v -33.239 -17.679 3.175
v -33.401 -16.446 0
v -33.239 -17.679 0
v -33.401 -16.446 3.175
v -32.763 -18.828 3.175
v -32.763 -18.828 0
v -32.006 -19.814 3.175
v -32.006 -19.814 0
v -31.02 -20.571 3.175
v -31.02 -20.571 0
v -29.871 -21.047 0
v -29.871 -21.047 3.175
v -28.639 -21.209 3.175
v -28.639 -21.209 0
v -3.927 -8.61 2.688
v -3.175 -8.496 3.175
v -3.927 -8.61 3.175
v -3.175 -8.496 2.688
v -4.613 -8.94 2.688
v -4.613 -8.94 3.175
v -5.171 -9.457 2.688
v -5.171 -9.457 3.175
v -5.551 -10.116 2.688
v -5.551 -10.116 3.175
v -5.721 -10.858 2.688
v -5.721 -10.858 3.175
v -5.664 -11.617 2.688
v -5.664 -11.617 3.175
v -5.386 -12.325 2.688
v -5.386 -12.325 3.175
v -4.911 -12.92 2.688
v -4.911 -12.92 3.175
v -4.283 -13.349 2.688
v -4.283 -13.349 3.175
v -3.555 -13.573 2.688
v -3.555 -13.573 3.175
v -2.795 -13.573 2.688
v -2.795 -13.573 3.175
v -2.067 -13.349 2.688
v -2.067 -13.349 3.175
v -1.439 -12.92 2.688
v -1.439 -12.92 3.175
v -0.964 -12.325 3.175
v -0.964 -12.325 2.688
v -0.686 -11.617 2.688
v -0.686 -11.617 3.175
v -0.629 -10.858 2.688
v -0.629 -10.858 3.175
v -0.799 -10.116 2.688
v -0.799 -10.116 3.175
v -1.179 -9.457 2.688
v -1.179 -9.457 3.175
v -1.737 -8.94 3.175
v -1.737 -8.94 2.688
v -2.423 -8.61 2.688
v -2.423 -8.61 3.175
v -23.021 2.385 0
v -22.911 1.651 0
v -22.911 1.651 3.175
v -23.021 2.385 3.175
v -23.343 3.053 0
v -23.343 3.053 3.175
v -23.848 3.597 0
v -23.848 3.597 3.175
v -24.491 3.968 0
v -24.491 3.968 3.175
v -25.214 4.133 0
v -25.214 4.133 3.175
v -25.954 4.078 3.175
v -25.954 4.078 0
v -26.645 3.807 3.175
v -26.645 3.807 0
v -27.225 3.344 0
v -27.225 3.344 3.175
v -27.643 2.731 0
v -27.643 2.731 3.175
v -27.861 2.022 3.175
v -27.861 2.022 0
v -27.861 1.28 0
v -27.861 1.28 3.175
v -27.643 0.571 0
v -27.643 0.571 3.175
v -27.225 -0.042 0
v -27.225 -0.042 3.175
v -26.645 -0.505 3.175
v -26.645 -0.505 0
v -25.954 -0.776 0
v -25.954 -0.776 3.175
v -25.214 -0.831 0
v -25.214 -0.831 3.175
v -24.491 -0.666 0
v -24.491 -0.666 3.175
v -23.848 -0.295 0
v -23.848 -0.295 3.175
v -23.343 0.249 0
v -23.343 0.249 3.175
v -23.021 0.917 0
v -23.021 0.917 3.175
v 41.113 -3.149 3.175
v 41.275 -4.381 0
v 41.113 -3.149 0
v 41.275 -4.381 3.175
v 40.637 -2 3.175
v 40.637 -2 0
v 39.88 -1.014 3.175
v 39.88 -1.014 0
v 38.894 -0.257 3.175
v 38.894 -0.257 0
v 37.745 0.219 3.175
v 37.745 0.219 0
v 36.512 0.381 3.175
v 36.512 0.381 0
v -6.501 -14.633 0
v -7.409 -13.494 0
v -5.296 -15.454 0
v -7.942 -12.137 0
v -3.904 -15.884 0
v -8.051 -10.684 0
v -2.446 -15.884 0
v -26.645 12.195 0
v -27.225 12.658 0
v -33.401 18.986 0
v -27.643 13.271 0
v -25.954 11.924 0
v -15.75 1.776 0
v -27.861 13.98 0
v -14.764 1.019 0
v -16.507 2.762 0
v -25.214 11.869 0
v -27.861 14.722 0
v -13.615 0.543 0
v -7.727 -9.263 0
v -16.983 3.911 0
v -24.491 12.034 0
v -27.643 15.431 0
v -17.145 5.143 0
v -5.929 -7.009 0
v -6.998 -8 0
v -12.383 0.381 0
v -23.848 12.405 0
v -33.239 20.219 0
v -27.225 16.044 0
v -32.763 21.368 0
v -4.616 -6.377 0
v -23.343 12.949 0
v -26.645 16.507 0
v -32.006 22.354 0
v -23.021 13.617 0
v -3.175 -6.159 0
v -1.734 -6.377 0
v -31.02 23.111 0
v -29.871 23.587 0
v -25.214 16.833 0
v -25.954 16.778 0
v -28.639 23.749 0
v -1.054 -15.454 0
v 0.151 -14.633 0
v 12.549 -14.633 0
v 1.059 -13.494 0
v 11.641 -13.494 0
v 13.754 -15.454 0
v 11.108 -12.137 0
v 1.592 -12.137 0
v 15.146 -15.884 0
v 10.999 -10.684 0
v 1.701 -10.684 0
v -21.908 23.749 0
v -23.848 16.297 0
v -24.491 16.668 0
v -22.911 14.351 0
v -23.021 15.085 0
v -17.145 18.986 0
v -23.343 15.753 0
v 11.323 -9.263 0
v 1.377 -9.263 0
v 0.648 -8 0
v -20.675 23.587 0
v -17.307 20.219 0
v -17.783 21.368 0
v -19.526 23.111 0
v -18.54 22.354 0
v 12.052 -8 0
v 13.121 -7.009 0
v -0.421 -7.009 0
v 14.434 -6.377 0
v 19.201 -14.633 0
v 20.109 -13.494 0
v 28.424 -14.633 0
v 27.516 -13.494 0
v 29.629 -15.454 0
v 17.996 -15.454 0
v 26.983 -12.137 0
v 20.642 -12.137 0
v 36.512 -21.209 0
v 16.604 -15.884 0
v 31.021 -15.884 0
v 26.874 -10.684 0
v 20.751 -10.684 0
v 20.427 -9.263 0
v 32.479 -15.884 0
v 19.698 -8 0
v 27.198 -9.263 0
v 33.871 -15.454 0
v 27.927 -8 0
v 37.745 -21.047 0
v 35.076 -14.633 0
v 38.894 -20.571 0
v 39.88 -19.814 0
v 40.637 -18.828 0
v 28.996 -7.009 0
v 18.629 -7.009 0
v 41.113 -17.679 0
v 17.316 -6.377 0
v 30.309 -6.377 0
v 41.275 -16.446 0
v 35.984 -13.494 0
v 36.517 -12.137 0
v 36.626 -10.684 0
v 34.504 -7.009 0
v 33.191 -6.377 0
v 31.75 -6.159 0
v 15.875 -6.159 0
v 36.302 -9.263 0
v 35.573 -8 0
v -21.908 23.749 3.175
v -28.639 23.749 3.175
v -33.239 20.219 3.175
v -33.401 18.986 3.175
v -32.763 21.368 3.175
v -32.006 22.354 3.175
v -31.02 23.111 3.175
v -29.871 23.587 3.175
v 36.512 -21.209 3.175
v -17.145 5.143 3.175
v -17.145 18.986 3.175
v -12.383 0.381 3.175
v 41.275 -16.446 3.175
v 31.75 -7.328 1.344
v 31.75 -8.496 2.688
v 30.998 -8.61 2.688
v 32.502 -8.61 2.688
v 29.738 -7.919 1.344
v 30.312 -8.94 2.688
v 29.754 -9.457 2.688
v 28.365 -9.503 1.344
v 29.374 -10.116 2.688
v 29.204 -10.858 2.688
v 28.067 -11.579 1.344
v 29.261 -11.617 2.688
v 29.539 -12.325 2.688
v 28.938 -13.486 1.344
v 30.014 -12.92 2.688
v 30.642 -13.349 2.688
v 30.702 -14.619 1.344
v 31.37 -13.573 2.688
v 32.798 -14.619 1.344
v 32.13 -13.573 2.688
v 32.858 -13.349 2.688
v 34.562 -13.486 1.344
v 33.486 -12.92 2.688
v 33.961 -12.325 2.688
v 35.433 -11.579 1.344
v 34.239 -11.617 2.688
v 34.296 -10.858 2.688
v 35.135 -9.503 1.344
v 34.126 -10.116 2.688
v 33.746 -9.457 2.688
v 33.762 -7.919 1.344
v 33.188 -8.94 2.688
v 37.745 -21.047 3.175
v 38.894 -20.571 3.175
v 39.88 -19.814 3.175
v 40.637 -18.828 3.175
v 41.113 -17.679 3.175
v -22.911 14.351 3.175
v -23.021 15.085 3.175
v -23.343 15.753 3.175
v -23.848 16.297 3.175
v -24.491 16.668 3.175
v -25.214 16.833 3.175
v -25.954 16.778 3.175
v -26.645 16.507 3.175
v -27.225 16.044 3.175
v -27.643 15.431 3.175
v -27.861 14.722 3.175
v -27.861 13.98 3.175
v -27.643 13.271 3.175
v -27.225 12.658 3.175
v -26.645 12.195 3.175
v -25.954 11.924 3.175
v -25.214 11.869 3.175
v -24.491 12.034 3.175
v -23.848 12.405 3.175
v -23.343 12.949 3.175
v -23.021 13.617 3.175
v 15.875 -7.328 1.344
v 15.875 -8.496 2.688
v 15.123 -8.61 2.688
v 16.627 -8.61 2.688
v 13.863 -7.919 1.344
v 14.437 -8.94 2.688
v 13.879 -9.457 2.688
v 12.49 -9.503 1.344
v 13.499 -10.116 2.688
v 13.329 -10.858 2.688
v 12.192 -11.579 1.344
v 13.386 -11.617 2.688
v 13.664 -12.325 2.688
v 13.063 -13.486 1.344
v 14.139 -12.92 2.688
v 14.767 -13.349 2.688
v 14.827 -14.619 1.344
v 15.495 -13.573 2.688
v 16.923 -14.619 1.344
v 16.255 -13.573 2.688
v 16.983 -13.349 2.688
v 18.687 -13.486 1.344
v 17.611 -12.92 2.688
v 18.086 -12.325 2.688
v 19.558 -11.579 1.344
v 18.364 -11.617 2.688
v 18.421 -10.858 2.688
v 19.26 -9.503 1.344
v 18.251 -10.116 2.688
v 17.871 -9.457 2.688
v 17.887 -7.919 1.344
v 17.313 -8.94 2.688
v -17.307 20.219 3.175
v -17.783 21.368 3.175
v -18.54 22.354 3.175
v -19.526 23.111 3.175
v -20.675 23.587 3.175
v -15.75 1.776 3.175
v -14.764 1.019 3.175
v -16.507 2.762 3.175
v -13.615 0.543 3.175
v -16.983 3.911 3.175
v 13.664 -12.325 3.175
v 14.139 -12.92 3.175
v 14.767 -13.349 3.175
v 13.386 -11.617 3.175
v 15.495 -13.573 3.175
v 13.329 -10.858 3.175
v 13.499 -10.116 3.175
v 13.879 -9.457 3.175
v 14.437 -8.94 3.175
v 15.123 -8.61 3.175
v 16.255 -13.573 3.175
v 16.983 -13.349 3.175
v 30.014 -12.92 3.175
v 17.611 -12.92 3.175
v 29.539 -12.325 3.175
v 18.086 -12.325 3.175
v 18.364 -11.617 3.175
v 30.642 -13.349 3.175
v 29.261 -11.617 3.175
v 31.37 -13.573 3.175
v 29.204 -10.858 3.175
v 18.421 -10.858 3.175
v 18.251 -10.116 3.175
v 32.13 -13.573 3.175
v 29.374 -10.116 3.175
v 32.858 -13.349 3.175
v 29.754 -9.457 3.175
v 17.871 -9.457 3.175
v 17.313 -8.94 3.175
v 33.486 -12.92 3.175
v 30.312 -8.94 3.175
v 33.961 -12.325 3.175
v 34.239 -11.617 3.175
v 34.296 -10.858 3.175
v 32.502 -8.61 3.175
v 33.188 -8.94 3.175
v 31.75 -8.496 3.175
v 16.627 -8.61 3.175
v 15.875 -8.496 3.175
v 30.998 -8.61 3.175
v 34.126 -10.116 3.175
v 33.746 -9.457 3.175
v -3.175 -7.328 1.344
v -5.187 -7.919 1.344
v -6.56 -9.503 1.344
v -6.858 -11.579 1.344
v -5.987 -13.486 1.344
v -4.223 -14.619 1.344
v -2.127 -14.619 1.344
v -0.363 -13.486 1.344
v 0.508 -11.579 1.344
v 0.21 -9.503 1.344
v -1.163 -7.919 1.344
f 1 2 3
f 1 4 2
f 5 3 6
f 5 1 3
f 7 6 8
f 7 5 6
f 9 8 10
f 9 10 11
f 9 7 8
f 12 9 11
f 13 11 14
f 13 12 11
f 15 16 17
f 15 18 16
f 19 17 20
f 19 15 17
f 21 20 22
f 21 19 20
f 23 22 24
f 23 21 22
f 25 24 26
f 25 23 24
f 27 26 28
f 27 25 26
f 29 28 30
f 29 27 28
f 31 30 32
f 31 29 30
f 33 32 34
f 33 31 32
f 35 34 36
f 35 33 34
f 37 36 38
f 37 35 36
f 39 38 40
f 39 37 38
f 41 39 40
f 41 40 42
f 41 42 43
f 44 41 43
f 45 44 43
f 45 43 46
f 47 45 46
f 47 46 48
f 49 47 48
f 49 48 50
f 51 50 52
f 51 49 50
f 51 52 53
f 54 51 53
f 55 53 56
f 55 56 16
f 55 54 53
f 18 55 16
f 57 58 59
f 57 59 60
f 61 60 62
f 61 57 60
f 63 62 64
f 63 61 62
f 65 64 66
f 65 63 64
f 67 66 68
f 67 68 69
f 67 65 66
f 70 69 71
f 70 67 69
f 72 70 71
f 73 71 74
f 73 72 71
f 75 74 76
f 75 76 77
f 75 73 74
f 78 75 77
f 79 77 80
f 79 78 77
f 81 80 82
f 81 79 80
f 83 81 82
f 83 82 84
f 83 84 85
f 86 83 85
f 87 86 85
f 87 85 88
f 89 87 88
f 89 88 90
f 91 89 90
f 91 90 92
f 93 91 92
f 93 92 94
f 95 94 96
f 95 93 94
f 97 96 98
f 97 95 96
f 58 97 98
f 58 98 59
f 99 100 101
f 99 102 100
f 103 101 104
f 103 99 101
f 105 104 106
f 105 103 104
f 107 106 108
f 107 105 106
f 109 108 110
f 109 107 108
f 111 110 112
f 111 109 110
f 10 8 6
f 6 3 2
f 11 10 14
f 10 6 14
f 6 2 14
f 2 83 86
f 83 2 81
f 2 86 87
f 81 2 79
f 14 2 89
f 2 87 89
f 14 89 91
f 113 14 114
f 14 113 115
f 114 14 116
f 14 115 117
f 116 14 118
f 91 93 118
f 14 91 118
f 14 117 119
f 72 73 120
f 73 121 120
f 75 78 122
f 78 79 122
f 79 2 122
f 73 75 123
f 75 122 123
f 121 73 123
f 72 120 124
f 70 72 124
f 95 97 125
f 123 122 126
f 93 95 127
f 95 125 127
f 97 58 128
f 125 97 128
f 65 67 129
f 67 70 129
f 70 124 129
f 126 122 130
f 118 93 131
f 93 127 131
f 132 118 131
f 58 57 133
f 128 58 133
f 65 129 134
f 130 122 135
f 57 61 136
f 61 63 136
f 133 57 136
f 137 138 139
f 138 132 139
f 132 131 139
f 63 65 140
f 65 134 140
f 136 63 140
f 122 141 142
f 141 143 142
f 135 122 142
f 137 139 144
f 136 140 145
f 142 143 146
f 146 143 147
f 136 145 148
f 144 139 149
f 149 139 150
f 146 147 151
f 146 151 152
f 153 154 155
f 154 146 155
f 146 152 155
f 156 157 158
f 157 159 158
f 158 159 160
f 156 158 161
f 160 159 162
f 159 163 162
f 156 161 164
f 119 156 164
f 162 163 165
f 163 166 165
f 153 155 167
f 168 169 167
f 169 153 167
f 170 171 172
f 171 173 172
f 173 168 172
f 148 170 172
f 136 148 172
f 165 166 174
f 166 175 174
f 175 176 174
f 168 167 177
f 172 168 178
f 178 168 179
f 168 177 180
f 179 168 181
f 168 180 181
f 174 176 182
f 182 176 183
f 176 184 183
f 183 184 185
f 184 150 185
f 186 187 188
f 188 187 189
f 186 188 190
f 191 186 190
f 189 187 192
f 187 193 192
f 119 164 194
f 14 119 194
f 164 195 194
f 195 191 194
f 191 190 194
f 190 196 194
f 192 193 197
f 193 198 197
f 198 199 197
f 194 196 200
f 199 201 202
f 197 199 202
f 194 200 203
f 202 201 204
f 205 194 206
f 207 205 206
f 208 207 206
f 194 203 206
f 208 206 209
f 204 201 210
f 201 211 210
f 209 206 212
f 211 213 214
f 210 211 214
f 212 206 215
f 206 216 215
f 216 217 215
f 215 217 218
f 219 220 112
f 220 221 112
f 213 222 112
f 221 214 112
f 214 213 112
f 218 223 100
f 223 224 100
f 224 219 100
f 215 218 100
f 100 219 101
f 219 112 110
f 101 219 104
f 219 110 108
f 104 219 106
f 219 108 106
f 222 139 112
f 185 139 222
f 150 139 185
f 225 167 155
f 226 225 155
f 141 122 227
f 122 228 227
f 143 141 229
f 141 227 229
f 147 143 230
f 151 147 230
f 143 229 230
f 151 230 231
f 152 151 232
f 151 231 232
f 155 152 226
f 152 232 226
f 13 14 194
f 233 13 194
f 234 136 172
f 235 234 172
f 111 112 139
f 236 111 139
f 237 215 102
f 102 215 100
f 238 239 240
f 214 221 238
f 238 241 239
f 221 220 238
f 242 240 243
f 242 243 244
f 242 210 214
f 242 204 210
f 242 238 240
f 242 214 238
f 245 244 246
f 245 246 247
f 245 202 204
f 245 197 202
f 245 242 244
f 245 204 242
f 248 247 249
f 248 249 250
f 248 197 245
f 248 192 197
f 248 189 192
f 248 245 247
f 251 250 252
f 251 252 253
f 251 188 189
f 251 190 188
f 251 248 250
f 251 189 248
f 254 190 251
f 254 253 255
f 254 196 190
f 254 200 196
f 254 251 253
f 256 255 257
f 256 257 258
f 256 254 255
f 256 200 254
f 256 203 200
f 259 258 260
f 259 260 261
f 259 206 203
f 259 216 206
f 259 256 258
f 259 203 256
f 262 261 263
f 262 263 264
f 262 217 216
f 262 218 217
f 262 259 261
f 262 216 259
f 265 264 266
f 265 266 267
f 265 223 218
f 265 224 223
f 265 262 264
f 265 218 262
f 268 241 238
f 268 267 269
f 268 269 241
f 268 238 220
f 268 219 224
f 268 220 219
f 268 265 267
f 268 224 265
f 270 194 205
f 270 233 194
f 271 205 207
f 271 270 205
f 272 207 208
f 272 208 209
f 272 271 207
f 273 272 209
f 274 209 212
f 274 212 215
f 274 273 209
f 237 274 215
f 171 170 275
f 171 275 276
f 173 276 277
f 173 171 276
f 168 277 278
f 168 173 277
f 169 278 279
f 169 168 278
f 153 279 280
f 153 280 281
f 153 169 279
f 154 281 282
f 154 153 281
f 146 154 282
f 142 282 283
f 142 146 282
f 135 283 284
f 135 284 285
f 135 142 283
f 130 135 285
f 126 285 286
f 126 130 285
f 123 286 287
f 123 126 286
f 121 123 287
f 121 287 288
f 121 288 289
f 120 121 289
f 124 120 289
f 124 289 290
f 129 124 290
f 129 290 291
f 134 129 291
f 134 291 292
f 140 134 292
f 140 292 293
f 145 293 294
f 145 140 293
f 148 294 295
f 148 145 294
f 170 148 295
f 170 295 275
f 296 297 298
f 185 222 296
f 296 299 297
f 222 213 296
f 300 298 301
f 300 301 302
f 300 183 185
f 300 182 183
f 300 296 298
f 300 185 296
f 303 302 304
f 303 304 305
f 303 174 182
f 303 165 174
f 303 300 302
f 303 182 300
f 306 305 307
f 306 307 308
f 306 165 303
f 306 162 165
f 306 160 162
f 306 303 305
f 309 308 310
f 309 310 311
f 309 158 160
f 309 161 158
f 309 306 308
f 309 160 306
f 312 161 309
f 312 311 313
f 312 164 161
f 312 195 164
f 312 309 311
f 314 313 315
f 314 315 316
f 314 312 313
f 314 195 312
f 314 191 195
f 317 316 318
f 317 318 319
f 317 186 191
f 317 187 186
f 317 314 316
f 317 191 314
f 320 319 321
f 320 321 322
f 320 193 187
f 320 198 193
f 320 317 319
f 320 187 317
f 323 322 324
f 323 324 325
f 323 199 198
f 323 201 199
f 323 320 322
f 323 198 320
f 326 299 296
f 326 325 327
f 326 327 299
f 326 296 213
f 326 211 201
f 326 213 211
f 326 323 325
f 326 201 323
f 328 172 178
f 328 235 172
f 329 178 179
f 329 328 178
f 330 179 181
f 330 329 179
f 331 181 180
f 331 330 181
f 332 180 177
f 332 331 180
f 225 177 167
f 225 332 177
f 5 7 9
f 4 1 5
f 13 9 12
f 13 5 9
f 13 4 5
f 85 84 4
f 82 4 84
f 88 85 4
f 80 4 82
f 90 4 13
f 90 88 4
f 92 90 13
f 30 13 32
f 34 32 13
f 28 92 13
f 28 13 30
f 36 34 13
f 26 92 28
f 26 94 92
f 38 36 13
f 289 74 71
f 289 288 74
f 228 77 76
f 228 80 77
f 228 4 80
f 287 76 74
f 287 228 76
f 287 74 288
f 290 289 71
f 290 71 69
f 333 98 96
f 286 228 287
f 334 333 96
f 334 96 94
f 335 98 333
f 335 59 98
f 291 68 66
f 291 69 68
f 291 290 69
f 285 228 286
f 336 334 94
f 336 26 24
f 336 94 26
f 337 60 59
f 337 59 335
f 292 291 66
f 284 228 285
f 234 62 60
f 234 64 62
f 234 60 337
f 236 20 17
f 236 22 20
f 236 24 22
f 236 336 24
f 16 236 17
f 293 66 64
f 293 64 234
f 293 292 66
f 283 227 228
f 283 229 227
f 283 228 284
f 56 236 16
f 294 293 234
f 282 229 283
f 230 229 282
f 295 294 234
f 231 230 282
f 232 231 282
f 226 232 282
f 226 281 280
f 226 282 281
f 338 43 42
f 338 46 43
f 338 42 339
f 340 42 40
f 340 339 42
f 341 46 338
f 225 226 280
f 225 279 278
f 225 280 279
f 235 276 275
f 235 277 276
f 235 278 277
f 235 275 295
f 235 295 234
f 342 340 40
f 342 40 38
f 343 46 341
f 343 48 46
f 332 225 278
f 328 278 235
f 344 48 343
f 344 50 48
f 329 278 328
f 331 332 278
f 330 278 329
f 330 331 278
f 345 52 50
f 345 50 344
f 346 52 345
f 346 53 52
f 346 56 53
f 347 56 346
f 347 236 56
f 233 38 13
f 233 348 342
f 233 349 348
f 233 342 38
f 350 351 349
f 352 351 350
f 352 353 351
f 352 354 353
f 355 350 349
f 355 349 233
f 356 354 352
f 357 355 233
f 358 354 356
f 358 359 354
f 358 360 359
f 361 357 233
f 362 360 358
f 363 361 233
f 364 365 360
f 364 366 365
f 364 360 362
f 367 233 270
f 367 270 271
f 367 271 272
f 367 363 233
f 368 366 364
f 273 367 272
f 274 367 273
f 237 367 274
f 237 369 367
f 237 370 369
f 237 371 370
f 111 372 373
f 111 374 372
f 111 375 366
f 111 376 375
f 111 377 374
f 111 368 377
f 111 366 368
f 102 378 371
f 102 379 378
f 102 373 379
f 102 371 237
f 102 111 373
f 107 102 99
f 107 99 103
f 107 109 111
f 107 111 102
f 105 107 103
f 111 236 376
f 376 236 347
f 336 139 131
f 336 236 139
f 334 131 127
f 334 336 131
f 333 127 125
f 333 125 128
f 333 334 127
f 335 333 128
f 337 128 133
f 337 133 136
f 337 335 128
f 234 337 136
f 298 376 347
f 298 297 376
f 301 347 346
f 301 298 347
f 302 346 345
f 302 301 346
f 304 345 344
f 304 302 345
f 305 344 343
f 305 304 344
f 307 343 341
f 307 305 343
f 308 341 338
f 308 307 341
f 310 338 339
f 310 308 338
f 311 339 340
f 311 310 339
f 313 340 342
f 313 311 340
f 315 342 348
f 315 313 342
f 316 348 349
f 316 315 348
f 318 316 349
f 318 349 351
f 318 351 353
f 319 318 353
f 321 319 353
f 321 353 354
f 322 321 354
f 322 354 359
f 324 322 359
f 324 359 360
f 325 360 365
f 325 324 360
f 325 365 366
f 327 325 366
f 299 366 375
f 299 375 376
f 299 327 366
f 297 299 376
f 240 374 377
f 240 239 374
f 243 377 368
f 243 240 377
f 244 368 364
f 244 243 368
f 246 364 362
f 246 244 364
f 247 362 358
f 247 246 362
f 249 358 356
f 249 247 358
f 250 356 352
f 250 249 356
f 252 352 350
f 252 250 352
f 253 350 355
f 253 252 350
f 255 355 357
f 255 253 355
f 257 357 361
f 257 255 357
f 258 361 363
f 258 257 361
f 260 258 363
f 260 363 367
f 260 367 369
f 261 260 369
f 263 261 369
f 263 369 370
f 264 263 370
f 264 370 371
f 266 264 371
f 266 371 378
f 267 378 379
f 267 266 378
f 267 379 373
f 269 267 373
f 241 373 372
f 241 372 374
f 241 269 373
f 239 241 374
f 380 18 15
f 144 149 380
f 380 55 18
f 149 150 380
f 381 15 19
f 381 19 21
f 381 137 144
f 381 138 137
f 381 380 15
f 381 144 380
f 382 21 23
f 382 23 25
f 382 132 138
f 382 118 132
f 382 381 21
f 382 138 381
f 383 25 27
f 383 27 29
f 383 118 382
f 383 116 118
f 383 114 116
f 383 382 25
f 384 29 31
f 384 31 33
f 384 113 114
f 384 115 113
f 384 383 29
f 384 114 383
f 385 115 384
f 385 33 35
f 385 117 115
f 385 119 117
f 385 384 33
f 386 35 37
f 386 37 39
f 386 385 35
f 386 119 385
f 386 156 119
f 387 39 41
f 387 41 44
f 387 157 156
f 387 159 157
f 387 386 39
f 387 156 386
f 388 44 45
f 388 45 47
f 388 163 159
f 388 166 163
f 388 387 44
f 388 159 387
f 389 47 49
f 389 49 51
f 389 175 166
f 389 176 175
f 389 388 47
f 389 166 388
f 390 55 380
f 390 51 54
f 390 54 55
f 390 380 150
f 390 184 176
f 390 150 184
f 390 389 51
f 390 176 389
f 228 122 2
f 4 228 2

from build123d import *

# Parameters (mm, degrees)
SKETCH1_R                                    = 2.4892
BOSS_EXTRUDE1_DEPTH                          = 3.175
FILLET1_R                                    = 4.7625
CSK_FOR_10_FLAT_HEAD_MACHINE_SCREW3_AT_COUNT = 2
CSK_FOR_10_FLAT_HEAD_MACHINE_SCREW3_AT_PITCH = 15.875
CSK_FOR_10_FLAT_HEAD_MACHINE_SCREW3_2_COUNT  = 2
CSK_FOR_10_FLAT_HEAD_MACHINE_SCREW3_2_PITCH  = 34.925


with BuildPart() as part:
    # Sketch1 → Boss-Extrude1 (new body)
    with BuildSketch(Plane.XY):
        Polygon((-33.401, 23.749), (-33.401, -21.209), (41.275, -21.209), (41.275, 0.381), (-17.145, 0.381), (-17.145, 23.749), align=None)
        with Locations((-25.4, -11.049)):
            Circle(SKETCH1_R, mode=Mode.SUBTRACT)
        with Locations((-25.4, 1.651)):
            Circle(SKETCH1_R, mode=Mode.SUBTRACT)
        with Locations((-25.4, 14.351)):
            Circle(SKETCH1_R, mode=Mode.SUBTRACT)
        with Locations((-25.4, -11.049)):
            Circle(SKETCH1_R)
    extrude(amount=BOSS_EXTRUDE1_DEPTH)

    # Fillet1
    fillet1_edges = [part.edges().sort_by_distance(p)[0] for p in [
        (-33.401, 23.749, 1.5875),
        (-17.145, 23.749, 1.5875),
        (-17.145, 0.381, 1.5875),
        (41.275, 0.381, 1.5875),
        (41.275, -21.209, 1.5875),
        (-33.401, -21.209, 1.5875),
    ]]
    fillet(fillet1_edges, radius=FILLET1_R)

    # Sketch7 → CSK for #10 Flat Head Machine Screw3 (revolve, cut)
    with BuildSketch(Plane(origin=(31.75, -11.049, 0), x_dir=(0, 1, 0), z_dir=(1, 0, 0))):
        Polygon((0, 0), (0, 3.175), (2.5527, 3.175), (2.5527, 2.688180894), (4.8895, 0), align=None)
    csk_for_10_flat_head_machine_screw3 = revolve(axis=Axis((31.75, -11.049, -6.35), (0, 0, 1)), mode=Mode.SUBTRACT)

    # CSK for #10 Flat Head Machine Screw3 at: CSK for #10 Flat Head Machine Screw3 ×2
    with Locations(*[(-i * CSK_FOR_10_FLAT_HEAD_MACHINE_SCREW3_AT_PITCH, 0, 0) for i in range(1, CSK_FOR_10_FLAT_HEAD_MACHINE_SCREW3_AT_COUNT)]):
        add(csk_for_10_flat_head_machine_screw3, mode=Mode.SUBTRACT)

    # CSK for _10 Flat Head Machine Screw3 2: CSK for #10 Flat Head Machine Screw3 ×2
    with Locations(*[(-i * CSK_FOR_10_FLAT_HEAD_MACHINE_SCREW3_2_PITCH, 0, 0) for i in range(1, CSK_FOR_10_FLAT_HEAD_MACHINE_SCREW3_2_COUNT)]):
        add(csk_for_10_flat_head_machine_screw3, mode=Mode.SUBTRACT)


solid = part.part
